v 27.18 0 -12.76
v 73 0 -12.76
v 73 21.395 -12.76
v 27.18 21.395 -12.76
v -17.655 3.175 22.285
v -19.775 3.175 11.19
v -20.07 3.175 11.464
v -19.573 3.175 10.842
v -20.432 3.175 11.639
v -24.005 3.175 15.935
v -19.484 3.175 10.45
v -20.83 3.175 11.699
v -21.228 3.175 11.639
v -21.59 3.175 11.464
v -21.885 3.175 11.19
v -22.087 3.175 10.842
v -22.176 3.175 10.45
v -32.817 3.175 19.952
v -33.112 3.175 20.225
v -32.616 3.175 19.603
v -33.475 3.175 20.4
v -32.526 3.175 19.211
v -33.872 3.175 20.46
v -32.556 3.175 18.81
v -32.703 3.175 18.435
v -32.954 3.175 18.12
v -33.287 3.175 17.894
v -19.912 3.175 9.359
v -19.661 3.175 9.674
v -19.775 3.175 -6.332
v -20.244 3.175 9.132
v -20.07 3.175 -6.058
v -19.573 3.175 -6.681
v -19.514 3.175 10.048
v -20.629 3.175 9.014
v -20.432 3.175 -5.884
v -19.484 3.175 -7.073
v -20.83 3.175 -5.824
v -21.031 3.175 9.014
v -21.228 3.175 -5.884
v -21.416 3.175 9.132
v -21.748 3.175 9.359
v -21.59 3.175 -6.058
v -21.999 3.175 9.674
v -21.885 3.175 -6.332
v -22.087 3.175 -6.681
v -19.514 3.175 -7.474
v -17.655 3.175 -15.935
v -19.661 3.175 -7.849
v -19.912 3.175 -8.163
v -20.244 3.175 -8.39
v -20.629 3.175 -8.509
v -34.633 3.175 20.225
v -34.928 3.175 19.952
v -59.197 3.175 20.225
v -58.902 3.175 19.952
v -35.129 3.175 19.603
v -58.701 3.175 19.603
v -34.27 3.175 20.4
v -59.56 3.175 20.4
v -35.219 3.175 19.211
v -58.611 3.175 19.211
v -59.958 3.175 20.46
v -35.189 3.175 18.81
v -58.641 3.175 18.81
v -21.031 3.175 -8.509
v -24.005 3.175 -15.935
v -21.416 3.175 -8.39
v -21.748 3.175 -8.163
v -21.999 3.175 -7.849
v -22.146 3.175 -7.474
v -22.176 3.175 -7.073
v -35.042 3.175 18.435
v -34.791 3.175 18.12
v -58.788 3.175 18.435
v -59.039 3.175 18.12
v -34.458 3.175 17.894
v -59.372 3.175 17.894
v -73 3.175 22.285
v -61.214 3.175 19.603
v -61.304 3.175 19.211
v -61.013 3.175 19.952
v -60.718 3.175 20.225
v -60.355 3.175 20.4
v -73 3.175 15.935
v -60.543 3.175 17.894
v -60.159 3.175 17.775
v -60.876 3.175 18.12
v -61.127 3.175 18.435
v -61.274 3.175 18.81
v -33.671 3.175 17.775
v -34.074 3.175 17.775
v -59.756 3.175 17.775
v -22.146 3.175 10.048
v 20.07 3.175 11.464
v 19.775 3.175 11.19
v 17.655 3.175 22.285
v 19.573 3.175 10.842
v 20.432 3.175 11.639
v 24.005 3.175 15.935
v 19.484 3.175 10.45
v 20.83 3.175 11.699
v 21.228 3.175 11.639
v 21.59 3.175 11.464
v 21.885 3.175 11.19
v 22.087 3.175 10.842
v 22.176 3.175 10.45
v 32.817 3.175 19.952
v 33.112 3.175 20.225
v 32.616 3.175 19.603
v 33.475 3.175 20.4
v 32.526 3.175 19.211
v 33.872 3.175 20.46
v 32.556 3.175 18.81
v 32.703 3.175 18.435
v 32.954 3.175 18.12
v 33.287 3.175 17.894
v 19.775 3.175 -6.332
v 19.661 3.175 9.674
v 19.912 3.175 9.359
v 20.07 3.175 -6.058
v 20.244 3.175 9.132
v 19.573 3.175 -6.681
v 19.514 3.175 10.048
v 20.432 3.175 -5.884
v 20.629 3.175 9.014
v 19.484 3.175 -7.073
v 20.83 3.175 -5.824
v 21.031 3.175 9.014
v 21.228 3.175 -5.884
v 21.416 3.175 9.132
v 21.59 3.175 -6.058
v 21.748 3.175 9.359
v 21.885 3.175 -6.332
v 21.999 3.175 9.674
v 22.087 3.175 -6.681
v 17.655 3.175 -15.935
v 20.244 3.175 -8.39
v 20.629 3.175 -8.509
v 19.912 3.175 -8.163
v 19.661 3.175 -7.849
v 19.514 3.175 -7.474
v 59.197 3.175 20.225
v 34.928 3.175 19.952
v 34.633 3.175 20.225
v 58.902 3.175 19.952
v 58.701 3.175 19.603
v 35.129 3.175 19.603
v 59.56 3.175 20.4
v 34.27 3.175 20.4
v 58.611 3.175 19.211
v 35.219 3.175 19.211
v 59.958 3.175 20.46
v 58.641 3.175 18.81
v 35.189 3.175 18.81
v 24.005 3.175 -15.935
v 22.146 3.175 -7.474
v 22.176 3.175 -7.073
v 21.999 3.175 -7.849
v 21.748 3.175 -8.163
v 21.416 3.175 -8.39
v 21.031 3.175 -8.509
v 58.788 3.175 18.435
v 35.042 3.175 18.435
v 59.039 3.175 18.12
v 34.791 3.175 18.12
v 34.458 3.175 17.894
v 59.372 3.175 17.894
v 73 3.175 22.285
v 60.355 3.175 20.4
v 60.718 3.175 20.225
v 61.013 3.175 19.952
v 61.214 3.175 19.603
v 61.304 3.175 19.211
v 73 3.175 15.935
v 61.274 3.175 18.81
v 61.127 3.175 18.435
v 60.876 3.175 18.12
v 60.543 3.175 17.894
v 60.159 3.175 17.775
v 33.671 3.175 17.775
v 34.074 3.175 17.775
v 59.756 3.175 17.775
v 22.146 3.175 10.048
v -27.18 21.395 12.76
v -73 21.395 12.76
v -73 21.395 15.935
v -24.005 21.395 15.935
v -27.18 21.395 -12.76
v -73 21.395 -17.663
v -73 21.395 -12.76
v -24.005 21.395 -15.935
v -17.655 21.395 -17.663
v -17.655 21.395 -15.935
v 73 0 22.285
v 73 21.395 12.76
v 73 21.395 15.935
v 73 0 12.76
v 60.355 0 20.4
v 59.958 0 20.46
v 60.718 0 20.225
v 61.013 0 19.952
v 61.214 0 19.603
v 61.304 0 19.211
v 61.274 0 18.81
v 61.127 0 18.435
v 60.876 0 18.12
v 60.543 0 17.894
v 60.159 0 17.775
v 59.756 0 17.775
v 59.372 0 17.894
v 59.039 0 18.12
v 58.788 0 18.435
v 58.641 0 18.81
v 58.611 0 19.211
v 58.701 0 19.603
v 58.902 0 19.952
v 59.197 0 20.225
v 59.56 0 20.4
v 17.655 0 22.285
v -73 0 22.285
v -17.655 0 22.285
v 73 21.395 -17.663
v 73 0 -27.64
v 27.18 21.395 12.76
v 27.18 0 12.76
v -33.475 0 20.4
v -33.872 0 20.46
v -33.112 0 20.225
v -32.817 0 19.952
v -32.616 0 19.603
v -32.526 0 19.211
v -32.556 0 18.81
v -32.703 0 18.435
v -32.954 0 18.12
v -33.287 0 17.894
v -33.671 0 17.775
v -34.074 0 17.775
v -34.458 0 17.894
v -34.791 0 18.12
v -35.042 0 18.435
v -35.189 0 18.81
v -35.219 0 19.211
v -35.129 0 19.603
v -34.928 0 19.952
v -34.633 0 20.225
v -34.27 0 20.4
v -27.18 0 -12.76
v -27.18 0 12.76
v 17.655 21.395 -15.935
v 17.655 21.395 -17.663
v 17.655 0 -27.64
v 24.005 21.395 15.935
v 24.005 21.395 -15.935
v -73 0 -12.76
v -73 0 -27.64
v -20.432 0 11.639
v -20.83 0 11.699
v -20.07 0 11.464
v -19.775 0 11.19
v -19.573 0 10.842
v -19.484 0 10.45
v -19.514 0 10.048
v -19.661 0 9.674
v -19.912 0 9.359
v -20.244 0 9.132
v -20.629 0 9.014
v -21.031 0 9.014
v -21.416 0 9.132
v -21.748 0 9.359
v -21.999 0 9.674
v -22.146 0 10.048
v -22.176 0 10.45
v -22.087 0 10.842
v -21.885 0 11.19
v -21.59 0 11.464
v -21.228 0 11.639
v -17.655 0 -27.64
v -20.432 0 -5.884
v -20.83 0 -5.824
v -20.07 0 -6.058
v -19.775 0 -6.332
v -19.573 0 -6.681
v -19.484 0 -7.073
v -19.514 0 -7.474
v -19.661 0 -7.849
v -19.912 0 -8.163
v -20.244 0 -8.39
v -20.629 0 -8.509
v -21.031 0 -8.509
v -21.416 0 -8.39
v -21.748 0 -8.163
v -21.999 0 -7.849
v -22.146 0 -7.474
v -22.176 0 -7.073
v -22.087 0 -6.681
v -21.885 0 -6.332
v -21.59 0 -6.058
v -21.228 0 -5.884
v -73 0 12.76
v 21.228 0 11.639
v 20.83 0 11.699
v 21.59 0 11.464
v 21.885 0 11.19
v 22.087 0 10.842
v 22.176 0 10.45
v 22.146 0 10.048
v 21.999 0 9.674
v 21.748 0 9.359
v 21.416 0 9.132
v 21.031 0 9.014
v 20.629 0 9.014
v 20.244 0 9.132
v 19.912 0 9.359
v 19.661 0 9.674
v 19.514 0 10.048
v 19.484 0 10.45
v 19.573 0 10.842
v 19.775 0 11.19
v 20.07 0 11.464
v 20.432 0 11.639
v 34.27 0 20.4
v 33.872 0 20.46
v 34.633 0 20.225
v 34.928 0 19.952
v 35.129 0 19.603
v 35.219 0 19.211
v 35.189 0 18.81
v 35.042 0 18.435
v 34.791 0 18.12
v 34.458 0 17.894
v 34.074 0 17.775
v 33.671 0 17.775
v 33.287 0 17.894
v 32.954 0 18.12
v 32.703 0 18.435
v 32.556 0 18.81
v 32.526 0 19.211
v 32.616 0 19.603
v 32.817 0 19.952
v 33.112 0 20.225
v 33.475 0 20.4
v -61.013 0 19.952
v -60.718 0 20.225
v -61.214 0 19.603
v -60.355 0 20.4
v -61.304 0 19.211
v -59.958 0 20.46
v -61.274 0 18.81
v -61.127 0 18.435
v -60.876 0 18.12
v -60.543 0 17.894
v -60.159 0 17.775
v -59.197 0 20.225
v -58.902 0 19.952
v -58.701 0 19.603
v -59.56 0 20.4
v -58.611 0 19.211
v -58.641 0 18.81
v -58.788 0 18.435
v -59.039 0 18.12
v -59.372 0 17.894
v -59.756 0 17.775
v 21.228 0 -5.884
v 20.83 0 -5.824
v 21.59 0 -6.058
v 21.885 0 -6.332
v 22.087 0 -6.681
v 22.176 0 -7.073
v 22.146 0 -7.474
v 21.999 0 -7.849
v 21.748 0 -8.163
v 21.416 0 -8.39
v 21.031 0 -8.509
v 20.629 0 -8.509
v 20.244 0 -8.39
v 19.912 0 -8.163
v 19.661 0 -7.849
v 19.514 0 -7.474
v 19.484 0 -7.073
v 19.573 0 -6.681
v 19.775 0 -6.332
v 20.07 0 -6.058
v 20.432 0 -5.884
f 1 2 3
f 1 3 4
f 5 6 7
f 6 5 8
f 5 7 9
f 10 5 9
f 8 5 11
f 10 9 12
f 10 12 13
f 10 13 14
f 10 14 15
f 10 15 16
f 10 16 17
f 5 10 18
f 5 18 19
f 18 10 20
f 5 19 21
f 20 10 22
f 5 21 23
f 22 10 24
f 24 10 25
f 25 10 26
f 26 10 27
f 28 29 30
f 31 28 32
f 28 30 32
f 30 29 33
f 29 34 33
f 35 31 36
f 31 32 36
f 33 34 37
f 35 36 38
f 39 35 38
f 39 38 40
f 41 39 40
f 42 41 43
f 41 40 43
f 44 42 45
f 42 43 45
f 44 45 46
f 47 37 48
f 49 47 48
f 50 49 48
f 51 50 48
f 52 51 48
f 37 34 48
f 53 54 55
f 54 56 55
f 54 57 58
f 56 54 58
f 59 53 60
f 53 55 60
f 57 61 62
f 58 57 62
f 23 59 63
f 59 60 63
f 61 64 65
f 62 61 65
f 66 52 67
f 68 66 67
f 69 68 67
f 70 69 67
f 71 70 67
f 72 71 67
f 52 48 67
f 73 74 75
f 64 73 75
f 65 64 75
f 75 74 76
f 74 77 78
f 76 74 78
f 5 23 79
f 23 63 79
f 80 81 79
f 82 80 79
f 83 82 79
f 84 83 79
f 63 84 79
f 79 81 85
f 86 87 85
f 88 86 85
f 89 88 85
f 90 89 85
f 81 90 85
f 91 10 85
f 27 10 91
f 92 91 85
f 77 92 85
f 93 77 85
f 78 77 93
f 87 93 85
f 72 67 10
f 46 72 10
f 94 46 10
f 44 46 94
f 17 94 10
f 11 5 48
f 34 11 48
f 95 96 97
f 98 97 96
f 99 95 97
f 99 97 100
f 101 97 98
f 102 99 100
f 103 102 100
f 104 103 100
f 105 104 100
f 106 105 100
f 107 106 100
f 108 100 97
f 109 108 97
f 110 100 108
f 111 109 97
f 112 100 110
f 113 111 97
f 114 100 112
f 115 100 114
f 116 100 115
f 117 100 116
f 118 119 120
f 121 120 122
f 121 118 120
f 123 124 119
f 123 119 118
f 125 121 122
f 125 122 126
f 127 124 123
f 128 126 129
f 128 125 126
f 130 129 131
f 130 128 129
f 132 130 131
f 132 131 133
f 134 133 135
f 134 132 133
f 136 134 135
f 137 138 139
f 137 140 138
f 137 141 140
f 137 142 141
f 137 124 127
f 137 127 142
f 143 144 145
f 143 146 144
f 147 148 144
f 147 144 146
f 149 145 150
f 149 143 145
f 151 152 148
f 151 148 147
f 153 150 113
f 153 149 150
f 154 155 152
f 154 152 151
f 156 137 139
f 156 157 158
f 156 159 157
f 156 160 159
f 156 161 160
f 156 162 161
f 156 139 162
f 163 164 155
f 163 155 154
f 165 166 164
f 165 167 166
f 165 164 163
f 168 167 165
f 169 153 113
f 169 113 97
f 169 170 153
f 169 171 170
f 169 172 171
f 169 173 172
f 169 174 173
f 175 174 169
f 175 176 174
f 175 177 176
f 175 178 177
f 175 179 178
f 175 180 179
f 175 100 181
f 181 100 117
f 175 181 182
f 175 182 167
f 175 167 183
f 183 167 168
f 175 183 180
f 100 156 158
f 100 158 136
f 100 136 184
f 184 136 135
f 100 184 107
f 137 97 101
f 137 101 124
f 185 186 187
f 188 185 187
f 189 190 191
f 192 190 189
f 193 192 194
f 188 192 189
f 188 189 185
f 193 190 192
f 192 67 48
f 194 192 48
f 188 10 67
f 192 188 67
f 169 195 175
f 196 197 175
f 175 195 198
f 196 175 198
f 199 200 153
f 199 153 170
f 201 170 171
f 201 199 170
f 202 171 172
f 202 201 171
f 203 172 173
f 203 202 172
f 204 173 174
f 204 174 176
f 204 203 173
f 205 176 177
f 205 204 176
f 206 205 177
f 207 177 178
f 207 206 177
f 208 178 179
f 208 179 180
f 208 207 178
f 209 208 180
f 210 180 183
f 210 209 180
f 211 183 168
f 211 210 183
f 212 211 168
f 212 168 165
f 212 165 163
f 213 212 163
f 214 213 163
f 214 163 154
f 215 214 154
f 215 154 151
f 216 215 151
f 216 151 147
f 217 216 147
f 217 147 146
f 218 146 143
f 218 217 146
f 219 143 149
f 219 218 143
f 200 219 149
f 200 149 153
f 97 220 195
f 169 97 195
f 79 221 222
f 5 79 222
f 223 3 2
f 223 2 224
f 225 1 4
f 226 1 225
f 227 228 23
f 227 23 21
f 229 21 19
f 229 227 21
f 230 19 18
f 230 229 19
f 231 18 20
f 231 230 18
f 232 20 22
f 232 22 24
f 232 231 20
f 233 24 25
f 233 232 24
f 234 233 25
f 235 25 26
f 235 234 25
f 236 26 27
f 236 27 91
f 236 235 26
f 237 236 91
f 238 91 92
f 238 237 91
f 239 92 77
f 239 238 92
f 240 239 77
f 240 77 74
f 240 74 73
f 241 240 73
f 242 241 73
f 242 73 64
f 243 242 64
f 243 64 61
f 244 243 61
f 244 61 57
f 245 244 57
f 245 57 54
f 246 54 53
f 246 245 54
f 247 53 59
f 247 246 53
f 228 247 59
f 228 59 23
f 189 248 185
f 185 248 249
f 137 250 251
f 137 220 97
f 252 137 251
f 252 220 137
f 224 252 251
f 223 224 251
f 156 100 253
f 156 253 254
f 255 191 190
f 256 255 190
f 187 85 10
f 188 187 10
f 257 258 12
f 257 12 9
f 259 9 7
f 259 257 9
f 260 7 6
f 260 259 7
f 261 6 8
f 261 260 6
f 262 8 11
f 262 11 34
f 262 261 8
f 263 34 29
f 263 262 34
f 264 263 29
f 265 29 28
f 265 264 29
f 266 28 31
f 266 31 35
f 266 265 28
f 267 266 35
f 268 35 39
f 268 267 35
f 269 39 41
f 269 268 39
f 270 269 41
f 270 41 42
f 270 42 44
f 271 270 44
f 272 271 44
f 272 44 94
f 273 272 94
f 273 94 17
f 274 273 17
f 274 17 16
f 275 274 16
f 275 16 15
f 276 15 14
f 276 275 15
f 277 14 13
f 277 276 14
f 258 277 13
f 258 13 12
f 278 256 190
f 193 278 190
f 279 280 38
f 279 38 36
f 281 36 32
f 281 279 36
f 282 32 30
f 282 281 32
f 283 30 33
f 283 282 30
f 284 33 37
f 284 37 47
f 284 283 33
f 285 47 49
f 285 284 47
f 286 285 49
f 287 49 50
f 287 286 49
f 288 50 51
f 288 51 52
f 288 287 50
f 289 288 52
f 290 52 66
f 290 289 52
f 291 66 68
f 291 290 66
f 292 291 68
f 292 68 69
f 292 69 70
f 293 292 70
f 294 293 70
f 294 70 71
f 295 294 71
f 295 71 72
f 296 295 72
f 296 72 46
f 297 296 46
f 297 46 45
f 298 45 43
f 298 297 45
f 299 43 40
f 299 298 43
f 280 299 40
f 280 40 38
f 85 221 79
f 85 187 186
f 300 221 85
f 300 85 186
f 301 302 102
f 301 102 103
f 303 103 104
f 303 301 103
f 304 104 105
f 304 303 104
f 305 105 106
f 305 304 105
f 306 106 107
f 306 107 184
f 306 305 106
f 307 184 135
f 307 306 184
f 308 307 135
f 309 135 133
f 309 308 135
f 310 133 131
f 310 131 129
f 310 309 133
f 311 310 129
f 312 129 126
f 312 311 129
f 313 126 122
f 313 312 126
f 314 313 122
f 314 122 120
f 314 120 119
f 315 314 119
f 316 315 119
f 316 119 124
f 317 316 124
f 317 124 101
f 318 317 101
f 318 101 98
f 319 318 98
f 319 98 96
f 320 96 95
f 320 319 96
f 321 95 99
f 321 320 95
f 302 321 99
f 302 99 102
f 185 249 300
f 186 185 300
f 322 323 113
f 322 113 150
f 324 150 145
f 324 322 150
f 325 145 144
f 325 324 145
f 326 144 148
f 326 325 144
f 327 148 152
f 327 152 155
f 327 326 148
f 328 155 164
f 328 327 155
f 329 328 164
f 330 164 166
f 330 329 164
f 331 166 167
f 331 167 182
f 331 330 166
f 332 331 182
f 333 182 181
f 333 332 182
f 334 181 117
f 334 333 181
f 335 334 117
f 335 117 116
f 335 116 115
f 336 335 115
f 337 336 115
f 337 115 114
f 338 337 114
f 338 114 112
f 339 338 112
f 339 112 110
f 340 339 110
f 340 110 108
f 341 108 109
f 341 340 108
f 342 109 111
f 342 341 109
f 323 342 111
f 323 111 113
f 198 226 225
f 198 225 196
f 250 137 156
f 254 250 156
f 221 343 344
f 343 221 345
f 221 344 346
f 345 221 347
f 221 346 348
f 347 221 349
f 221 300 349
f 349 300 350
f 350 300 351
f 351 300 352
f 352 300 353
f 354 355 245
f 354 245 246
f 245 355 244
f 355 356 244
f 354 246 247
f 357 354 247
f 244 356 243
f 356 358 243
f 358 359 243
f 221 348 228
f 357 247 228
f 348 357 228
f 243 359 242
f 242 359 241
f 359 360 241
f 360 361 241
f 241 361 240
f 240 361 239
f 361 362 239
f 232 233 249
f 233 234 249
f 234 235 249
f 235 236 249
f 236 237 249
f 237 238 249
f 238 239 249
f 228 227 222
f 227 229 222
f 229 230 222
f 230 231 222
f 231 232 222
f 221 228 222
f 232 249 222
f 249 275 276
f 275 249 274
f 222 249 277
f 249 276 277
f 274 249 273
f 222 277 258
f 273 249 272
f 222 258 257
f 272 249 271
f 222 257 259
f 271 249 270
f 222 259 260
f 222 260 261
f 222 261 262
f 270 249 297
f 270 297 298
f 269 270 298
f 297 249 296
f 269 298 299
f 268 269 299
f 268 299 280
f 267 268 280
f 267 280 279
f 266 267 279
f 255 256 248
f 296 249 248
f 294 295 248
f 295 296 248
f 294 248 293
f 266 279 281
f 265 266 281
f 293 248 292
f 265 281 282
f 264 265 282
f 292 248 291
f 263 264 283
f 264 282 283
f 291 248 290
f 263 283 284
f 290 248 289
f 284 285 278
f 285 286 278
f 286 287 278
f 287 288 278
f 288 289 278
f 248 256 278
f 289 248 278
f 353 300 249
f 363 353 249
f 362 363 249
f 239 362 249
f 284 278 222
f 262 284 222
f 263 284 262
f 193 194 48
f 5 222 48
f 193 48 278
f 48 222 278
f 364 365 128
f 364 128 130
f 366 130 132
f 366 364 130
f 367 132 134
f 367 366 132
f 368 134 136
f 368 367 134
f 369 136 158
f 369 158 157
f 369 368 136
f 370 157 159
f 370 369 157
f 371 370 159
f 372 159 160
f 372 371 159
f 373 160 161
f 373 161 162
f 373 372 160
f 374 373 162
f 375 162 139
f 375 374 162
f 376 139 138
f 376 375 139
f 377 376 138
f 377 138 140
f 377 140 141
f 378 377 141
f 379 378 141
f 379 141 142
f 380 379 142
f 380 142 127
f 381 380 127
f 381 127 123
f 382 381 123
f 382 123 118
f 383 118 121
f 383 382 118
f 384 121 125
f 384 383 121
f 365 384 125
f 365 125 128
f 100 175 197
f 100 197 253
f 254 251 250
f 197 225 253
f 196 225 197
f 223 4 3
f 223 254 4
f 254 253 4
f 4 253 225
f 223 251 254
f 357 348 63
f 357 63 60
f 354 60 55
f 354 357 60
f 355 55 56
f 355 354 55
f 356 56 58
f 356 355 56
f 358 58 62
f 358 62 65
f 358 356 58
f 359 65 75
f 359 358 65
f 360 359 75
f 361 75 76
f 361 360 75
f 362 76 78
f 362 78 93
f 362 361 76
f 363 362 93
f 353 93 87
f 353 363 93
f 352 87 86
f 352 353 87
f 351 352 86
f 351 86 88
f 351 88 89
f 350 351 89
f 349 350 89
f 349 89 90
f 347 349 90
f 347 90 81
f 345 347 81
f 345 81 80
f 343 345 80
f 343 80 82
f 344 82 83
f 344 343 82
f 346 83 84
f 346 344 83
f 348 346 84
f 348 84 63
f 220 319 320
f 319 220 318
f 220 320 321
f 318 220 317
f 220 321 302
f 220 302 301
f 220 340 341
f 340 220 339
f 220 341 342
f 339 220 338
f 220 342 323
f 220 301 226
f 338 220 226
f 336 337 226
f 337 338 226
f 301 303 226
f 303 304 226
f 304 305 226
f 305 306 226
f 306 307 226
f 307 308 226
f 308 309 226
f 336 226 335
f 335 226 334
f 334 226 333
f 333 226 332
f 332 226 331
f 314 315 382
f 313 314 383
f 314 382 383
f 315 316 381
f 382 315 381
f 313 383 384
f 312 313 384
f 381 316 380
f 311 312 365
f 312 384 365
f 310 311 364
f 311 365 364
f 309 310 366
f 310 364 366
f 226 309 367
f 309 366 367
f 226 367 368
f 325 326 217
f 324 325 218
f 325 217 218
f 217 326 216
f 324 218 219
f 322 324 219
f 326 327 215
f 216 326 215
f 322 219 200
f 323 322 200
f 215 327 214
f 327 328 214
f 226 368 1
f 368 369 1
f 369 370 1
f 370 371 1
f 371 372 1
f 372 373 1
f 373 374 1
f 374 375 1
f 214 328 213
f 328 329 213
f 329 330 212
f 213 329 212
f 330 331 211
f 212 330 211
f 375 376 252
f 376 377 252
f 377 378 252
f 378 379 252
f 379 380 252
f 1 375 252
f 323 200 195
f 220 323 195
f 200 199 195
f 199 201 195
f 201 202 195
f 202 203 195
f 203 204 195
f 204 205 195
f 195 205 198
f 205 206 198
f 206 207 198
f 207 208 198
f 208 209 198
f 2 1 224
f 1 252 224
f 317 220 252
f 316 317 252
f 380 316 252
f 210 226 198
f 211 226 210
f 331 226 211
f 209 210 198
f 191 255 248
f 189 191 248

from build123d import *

# Parameters (mm, degrees)
BOSS_EXTRUDE1_DEPTH   = 21.395
BOSS_EXTRUDE1_2_DEPTH = 21.395
SKETCH2_R             = 1.35
BOSS_EXTRUDE2_DEPTH   = 3.175
SKETCH4_W             = 55.345
SKETCH4_H             = 11.705
BOSS_EXTRUDE3_DEPTH   = 21.395
CUT_EXTRUDE1_DEPTH    = 151.12566611


with BuildPart() as part:
    # Sketch1 → Boss-Extrude1 (new body)
    with BuildSketch(Plane(origin=(0, 0, 0), x_dir=(1, 0, 0), z_dir=(0, 1, 0))):
        Polygon((-73, 12.76), (-27.18, 12.76), (-27.18, -12.76), (-73, -12.76), (-73, -15.935), (-24.005, -15.935), (-24.005, 15.935), (-73, 15.935), align=None)
    extrude(amount=BOSS_EXTRUDE1_DEPTH)



with BuildPart() as body_2:
    # Sketch1 → Boss-Extrude1 2 (new body)
    with BuildSketch(Plane(origin=(0, 0, 0), x_dir=(1, 0, 0), z_dir=(0, 1, 0))):
        Polygon((73, 12.76), (27.18, 12.76), (27.18, -12.76), (73, -12.76), (73, -15.935), (24.005, -15.935), (24.005, 15.935), (73, 15.935), align=None)
    extrude(amount=BOSS_EXTRUDE1_2_DEPTH)


with BuildPart() as part_1:
    add(part.part)

    add(body_2.part)  # Boss-Extrude2 merges body 2
    # Sketch2 → Boss-Extrude2 (add)
    # profile 1 of 2: a face of its own
    with BuildSketch(Plane(origin=(0, 0, 0), x_dir=(1, 0, 0), z_dir=(0, 1, 0))):
        Polygon((-73, -15.935), (-24.005, -15.935), (-24.005, 15.935), (-17.655, 15.935), (-17.655, -22.285), (-24.005, -22.285), (-73, -22.285), align=None)
        with Locations(Location((-20.83, -10.34875, 0), (0, 0, 270))):
            Circle(SKETCH2_R, mode=Mode.SUBTRACT)
        with Locations(Location((-20.83, 7.17375, 0), (0, 0, 270))):
            Circle(SKETCH2_R, mode=Mode.SUBTRACT)
        with Locations(Location((-59.9575, -19.11, 0), (0, 0, 270))):
            Circle(SKETCH2_R, mode=Mode.SUBTRACT)
        with Locations(Location((-33.8725, -19.11, 0), (0, 0, 270))):
            Circle(SKETCH2_R, mode=Mode.SUBTRACT)
    # profile 2 of 2: a face of its own
    with BuildSketch(Plane(origin=(0, 0, 0), x_dir=(1, 0, 0), z_dir=(0, 1, 0))):
        Polygon((73, -15.935), (24.005, -15.935), (24.005, 15.935), (17.655, 15.935), (17.655, -22.285), (24.005, -22.285), (73, -22.285), align=None)
        with Locations(Location((20.83, 7.17375, 0), (0, 0, 270))):
            Circle(SKETCH2_R, mode=Mode.SUBTRACT)
        with Locations(Location((20.83, -10.34875, 0), (0, 0, 270))):
            Circle(SKETCH2_R, mode=Mode.SUBTRACT)
        with Locations(Location((33.8725, -19.11, 0), (0, 0, 270))):
            Circle(SKETCH2_R, mode=Mode.SUBTRACT)
        with Locations(Location((59.9575, -19.11, 0), (0, 0, 270))):
            Circle(SKETCH2_R, mode=Mode.SUBTRACT)
    extrude(amount=BOSS_EXTRUDE2_DEPTH)

    # Sketch4 → Boss-Extrude3 (add)
    with BuildSketch(Plane(origin=(0, 0, 0), x_dir=(1, 0, 0), z_dir=(0, 1, 0))):
        with Locations((-45.3275, 21.7875)):
            Rectangle(SKETCH4_W, SKETCH4_H)
        with Locations((45.3275, 21.7875)):
            Rectangle(SKETCH4_W, SKETCH4_H)
    extrude(amount=BOSS_EXTRUDE3_DEPTH)

    # Sketch5 → Cut-Extrude1 (cut, through all)
    with BuildSketch(Plane.ZY.offset(73)):
        Polygon((-27.64, 21.395), (-27.64, 0), (-17.663347654, 21.395), align=None)
    extrude(amount=-CUT_EXTRUDE1_DEPTH, mode=Mode.SUBTRACT)


solid = part_1.part
